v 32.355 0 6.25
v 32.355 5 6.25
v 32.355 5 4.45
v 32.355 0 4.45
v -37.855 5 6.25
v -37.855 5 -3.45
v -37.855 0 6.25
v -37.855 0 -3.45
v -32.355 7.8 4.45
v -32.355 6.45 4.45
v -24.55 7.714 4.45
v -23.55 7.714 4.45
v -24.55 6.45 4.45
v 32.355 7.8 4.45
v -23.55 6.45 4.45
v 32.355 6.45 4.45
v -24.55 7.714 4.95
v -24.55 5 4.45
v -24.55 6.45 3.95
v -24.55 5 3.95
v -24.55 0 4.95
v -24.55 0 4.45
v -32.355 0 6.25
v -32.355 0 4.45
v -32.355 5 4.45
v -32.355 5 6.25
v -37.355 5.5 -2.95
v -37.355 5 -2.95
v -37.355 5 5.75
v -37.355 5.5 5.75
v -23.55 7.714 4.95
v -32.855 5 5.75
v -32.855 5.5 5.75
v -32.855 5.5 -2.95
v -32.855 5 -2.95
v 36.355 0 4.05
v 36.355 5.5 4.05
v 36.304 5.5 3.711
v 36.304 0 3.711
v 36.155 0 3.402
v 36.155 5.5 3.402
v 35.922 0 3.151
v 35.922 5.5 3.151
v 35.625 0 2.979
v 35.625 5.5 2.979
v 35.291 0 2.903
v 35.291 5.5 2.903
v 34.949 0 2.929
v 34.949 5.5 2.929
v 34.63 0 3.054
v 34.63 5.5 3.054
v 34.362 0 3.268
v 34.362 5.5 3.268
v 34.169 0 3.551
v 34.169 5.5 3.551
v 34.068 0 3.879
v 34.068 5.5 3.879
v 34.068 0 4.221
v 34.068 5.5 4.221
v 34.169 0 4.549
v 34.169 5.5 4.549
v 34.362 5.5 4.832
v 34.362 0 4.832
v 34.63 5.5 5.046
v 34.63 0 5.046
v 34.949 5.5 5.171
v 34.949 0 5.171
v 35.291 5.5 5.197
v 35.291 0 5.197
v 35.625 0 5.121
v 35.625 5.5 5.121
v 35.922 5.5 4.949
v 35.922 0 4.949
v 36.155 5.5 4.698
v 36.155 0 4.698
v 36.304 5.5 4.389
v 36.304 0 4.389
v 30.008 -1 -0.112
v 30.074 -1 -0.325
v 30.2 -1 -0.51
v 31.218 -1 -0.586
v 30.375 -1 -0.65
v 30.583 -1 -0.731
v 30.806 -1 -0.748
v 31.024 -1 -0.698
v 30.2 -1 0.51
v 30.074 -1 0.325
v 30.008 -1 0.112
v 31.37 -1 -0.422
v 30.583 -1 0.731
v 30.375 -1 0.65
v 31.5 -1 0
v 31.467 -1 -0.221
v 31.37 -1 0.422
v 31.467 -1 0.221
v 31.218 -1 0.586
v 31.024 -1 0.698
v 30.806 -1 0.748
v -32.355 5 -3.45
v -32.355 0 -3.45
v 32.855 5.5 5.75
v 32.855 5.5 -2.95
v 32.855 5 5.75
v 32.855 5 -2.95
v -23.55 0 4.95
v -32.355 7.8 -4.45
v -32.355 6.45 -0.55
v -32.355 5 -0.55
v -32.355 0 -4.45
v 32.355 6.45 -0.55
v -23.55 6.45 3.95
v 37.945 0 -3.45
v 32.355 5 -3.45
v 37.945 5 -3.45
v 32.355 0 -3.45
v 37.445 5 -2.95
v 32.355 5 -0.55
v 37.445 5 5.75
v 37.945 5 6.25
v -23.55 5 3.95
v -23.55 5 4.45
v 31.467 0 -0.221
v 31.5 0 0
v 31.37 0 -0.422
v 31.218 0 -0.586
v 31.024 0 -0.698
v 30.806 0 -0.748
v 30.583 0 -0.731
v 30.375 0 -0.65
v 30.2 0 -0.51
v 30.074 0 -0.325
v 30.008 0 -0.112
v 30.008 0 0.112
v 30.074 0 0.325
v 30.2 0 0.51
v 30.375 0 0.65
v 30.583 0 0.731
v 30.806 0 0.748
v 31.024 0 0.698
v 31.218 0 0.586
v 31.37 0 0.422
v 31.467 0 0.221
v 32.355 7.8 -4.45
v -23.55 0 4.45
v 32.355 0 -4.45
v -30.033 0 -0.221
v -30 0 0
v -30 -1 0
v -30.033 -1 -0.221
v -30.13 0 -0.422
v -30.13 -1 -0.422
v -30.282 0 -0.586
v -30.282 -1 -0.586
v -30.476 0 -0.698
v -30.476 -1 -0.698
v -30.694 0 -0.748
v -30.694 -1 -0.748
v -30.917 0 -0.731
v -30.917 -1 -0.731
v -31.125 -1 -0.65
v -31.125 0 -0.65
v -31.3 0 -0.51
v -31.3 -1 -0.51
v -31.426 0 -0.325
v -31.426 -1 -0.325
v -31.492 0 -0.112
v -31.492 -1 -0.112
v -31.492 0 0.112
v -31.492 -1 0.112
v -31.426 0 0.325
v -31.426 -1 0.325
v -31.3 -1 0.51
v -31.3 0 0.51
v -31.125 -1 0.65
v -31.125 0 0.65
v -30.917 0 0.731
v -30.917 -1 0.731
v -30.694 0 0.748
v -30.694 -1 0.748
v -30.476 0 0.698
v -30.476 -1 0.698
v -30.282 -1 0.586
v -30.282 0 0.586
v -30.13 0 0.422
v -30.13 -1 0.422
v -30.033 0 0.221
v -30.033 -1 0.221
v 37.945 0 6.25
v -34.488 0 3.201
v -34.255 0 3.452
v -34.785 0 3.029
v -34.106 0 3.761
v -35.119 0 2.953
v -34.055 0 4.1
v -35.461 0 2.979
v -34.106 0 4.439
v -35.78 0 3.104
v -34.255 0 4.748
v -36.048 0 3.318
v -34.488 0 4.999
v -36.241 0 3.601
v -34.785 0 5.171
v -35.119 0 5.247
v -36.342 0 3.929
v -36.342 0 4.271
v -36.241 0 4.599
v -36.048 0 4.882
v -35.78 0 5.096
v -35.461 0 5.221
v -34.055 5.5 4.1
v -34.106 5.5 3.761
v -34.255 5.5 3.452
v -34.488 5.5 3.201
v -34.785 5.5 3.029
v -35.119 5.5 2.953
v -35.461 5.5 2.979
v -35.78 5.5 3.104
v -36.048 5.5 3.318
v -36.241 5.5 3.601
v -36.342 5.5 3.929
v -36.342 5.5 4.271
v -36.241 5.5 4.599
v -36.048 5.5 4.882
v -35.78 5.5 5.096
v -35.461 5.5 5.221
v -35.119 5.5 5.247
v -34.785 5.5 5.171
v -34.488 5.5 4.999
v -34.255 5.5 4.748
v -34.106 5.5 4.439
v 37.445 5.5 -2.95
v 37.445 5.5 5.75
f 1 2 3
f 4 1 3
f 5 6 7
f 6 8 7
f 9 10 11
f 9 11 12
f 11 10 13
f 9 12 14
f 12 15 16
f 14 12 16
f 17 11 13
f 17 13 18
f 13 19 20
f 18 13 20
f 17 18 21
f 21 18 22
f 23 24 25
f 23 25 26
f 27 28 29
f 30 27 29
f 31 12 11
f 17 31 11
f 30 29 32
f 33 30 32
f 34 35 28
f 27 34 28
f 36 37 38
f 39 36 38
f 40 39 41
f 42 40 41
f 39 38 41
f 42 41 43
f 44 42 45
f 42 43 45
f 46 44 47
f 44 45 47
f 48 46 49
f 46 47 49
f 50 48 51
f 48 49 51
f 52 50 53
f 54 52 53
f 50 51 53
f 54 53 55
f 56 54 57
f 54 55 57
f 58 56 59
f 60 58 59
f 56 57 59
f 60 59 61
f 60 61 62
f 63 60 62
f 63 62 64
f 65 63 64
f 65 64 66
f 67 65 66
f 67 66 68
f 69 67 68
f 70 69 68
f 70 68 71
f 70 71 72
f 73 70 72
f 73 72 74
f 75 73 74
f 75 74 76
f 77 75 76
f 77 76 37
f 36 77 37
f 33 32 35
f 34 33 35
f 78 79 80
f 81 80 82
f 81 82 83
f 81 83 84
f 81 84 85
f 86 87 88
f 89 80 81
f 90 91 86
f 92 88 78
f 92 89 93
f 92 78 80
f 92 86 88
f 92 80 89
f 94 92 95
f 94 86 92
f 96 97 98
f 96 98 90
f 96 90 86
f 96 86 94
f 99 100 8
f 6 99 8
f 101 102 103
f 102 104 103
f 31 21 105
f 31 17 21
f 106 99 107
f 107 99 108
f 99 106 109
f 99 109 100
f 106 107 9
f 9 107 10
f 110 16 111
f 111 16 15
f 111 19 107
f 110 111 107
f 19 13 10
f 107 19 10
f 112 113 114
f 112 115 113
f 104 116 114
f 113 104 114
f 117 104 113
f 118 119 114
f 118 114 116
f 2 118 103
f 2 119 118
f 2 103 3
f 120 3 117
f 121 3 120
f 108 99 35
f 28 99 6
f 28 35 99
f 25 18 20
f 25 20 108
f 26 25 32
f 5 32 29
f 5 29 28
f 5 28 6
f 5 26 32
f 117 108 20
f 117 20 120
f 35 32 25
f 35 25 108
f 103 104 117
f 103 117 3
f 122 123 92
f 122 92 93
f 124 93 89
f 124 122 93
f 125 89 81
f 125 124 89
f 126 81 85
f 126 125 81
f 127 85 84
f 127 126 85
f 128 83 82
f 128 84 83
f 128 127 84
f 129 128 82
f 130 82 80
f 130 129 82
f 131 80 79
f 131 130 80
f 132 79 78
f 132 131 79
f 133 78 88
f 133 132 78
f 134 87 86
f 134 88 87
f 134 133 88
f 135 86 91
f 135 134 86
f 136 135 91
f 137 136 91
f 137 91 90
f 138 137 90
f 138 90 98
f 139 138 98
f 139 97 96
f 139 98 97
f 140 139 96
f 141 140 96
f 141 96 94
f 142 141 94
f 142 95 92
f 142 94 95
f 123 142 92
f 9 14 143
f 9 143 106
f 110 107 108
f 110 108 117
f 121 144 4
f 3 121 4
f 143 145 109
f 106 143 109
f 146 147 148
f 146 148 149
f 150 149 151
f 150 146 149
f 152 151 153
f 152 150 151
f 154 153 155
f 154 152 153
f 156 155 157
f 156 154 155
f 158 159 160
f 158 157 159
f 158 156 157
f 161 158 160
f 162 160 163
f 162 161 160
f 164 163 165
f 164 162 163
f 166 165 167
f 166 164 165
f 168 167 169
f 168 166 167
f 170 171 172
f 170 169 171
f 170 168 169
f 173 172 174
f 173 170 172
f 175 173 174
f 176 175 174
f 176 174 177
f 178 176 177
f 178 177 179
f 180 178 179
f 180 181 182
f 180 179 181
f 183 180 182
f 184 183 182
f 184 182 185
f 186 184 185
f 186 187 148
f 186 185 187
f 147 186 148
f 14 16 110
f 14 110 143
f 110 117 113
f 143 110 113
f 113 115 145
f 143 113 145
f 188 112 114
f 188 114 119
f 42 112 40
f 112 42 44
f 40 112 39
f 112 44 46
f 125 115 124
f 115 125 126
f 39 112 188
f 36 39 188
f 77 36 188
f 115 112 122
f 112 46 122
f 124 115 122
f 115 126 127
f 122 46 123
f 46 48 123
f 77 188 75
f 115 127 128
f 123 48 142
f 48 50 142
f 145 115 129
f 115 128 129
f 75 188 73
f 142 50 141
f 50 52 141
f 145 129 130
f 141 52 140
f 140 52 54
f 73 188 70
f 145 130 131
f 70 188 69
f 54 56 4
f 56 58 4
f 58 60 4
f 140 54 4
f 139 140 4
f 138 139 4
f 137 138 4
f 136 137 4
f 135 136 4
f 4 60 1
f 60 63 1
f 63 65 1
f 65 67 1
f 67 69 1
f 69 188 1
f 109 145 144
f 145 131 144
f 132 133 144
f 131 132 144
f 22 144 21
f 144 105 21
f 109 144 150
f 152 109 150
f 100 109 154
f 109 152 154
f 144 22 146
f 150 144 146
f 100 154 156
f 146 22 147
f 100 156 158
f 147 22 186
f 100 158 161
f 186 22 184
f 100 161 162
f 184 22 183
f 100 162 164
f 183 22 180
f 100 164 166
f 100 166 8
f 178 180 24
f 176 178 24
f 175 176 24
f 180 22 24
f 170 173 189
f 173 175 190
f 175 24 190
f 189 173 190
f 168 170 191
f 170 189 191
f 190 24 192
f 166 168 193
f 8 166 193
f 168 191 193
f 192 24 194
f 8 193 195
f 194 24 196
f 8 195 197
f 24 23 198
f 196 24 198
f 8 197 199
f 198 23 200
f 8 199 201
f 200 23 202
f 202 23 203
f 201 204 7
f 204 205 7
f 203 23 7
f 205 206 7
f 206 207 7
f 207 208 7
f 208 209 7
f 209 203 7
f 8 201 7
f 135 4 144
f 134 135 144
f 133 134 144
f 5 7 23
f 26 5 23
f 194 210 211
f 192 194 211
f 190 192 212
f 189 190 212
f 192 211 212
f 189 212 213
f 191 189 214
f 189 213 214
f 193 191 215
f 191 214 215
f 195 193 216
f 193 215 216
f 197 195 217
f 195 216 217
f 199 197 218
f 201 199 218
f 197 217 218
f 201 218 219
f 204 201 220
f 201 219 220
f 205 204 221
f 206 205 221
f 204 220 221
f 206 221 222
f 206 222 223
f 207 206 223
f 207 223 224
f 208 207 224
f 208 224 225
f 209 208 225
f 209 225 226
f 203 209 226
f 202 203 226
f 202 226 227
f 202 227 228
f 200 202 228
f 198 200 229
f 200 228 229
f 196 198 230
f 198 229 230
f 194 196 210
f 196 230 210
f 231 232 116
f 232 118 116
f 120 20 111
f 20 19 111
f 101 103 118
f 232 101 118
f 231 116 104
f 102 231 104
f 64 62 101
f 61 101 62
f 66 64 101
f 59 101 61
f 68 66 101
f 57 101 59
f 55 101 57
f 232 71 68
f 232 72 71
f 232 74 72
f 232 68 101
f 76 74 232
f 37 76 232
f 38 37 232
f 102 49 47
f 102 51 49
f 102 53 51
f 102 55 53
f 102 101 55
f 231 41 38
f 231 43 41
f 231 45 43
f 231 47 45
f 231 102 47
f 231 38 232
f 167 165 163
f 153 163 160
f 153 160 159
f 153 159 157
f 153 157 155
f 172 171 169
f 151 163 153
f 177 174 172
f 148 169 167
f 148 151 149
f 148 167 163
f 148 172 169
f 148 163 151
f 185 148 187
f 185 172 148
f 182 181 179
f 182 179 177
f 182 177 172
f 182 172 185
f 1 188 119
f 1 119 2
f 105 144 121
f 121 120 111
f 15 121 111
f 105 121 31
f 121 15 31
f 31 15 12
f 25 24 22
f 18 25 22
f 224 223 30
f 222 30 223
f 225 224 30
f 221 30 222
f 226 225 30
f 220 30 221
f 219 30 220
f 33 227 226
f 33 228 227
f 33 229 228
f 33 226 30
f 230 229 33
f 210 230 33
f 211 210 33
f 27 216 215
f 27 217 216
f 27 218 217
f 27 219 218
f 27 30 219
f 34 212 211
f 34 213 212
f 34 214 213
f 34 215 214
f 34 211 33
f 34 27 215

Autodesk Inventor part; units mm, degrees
ref_plane "YZ Plane" through (0, 0, 0) normal (1, 0, 0) x (0, 1, 0)
ref_plane "XZ Plane" through (0, 0, 0) normal (0, 1, 0) x (-1, 0, 0)
ref_plane "XY Plane" through (0, 0, 0) normal (0, 0, 1) x (1, 0, 0)
sketch "Sketch1" plane through (0, 0, 0) normal (0, 1, 0) x (-1, 0, 0)
  line L0 (32.355, 4.45) -> (-32.355, 4.45)
  line L1 (-32.355, 4.45) -> (-32.355, -4.45)
  line L2 (-32.355, -4.45) -> (32.355, -4.45)
  line L3 (32.355, -4.45) -> (32.355, 4.45)
  point P0 (0, 0)
  dimension "d0" = 64.71
  dimension "d1" = 32.355
  dimension "d2" = 8.9
  dimension "d3" = 4.45
extrude "Extrusion1" add sketch "Sketch1" along normal blind 7.8
sketch "Sketch2" plane through (0, 0, 0) normal (0, 1, 0) x (-1, 0, 0)
  line L0 (-32.355, 4.45) -> (-32.355, -4.45) projected
  line L1 (-32.355, -3.45) -> (-37.945, -3.45)
  line L2 (-37.945, -3.45) -> (-37.945, 6.25)
  line L3 (-37.945, 6.25) -> (-32.355, 6.25)
  line L4 (-32.355, 6.25) -> (-32.355, -3.45)
  line L5 (-32.355, -4.45) -> (32.355, -4.45) projected
  line L6 (32.355, -4.45) -> (32.355, 4.45) projected
  line L7 (32.355, -3.45) -> (37.855, -3.45)
  line L8 (37.855, -3.45) -> (37.855, 6.25)
  line L9 (37.855, 6.25) -> (32.355, 6.25)
  line L10 (32.355, 6.25) -> (32.355, -3.45)
  point P0 (0, 0)
  dimension "d6" = 10.7
  dimension "d7" = 5.59
  dimension "d8" = 10.7
  dimension "d9" = 5.5
  dimension "d10" = 1
  dimension "d11" = 1
extrude "Extrusion2" add sketch "Sketch2" along normal blind 5
sketch "Sketch3" plane through (-32.355, 7.8, 4.45) normal (0, 0, 1) x (1, 0, 0)
  line L0 (0, -2.8) -> (0, 0) projected
  line L1 (64.71, -7.8) -> (64.71, 0) projected
  line L2 (0, -2.8) -> (64.71, -2.8)
  line L3 (64.71, -2.8) -> (64.71, -1.35)
  line L4 (64.71, -1.35) -> (0, -1.35)
  line L5 (0, -1.35) -> (0, -2.8)
  point P0 (32.355, -7.8)
  dimension "d14" = 1.45
extrude "Extrusion3" cut sketch "Sketch3" against normal blind 5
sketch "Sketch4" plane through (0, 5, 0) normal (0, 1, 0) x (1, 0, 0)
  line L0 (32.355, -6.25) -> (37.945, -6.25) projected
  line L1 (37.945, 3.45) -> (32.355, 3.45) projected
  line L2 (37.945, -6.25) -> (32.355, -6.25)
  line L3 (32.355, -6.25) -> (32.355, 3.45)
  line L4 (32.355, 3.45) -> (37.945, 3.45)
  line L5 (37.945, 3.45) -> (37.945, -6.25)
  line L6 (-37.855, -6.25) -> (-32.355, -6.25) projected
  line L7 (-32.355, 3.45) -> (-37.855, 3.45) projected
  line L8 (-37.855, -6.25) -> (-32.355, -6.25)
  line L9 (-32.355, -6.25) -> (-32.355, 3.45)
  line L10 (-32.355, 3.45) -> (-37.855, 3.45)
  line L11 (-37.855, 3.45) -> (-37.855, -6.25)
  line L12 (-37.355, -5.75) -> (-32.855, -5.75)
  line L13 (-32.855, -5.75) -> (-32.855, 2.95)
  line L14 (-32.855, 2.95) -> (-37.355, 2.95)
  line L15 (-37.355, 2.95) -> (-37.355, -5.75)
  line L16 (32.855, -5.75) -> (37.445, -5.75)
  line L17 (37.445, -5.75) -> (37.445, 2.95)
  line L18 (37.445, 2.95) -> (32.855, 2.95)
  line L19 (32.855, 2.95) -> (32.855, -5.75)
  point P0 (0, 0)
  dimension "d17" = 0.5
  dimension "d18" = 0.5
extrude "Extrusion4" add sketch "Sketch4" along normal blind 0.5 contours L15 L14 L13 L12 | L19 L18 L17 L16
sketch "Sketch5" plane through (0, 5.5, 0) normal (0, 1, 0) x (1, 0, 0)
  circle A0 centre (35.205, -4.05) radius 1.15
  circle A1 centre (-35.205, -4.1) radius 1.15
  point P0 (0, 0)
  dimension "d21" = 4.1
  dimension "d22" = 4.05
  dimension "d23" = 70.41
  dimension "d24" = 35.205
  dimension "d35" = 2.3
  dimension "d36" = 2.3
extrude "Extrusion5" cut sketch "Sketch5" against normal through all
sketch "Sketch6" plane through (0, 0, 0) normal (0, -1, 0) x (1, 0, 0)
  circle A0 centre (30.75, 0) radius 0.75
  circle A1 centre (-30.75, 0) radius 0.75
  point P0 (0, 0)
  dimension "d27" = 61.5
  dimension "d28" = 30.75
  dimension "d29" = 1.5
  dimension "d30" = 1.5
  dimension "d33" = 0
  dimension "d34" = 0
extrude "Extrusion6" add sketch "Sketch6" along normal blind 1
sketch "Sketch7" plane through (-32.355, 0, 4.45) normal (0, 0, 1) x (1, 0, 0)
  line L0 (64.71, 0) -> (0, 0) projected
  line L1 (7.805, 0) -> (8.805, 0)
  line L2 (8.805, 0) -> (8.805, 7.7141)
  line L3 (8.805, 7.7141) -> (7.805, 7.7141)
  line L4 (7.805, 7.7141) -> (7.805, 0)
  point P0 (32.355, 0)
  dimension "d37" = 1
  dimension "d38" = 23.55
extrude "Extrusion7" add sketch "Sketch7" along normal mid plane 1
properties part number "QSevenConnector"
